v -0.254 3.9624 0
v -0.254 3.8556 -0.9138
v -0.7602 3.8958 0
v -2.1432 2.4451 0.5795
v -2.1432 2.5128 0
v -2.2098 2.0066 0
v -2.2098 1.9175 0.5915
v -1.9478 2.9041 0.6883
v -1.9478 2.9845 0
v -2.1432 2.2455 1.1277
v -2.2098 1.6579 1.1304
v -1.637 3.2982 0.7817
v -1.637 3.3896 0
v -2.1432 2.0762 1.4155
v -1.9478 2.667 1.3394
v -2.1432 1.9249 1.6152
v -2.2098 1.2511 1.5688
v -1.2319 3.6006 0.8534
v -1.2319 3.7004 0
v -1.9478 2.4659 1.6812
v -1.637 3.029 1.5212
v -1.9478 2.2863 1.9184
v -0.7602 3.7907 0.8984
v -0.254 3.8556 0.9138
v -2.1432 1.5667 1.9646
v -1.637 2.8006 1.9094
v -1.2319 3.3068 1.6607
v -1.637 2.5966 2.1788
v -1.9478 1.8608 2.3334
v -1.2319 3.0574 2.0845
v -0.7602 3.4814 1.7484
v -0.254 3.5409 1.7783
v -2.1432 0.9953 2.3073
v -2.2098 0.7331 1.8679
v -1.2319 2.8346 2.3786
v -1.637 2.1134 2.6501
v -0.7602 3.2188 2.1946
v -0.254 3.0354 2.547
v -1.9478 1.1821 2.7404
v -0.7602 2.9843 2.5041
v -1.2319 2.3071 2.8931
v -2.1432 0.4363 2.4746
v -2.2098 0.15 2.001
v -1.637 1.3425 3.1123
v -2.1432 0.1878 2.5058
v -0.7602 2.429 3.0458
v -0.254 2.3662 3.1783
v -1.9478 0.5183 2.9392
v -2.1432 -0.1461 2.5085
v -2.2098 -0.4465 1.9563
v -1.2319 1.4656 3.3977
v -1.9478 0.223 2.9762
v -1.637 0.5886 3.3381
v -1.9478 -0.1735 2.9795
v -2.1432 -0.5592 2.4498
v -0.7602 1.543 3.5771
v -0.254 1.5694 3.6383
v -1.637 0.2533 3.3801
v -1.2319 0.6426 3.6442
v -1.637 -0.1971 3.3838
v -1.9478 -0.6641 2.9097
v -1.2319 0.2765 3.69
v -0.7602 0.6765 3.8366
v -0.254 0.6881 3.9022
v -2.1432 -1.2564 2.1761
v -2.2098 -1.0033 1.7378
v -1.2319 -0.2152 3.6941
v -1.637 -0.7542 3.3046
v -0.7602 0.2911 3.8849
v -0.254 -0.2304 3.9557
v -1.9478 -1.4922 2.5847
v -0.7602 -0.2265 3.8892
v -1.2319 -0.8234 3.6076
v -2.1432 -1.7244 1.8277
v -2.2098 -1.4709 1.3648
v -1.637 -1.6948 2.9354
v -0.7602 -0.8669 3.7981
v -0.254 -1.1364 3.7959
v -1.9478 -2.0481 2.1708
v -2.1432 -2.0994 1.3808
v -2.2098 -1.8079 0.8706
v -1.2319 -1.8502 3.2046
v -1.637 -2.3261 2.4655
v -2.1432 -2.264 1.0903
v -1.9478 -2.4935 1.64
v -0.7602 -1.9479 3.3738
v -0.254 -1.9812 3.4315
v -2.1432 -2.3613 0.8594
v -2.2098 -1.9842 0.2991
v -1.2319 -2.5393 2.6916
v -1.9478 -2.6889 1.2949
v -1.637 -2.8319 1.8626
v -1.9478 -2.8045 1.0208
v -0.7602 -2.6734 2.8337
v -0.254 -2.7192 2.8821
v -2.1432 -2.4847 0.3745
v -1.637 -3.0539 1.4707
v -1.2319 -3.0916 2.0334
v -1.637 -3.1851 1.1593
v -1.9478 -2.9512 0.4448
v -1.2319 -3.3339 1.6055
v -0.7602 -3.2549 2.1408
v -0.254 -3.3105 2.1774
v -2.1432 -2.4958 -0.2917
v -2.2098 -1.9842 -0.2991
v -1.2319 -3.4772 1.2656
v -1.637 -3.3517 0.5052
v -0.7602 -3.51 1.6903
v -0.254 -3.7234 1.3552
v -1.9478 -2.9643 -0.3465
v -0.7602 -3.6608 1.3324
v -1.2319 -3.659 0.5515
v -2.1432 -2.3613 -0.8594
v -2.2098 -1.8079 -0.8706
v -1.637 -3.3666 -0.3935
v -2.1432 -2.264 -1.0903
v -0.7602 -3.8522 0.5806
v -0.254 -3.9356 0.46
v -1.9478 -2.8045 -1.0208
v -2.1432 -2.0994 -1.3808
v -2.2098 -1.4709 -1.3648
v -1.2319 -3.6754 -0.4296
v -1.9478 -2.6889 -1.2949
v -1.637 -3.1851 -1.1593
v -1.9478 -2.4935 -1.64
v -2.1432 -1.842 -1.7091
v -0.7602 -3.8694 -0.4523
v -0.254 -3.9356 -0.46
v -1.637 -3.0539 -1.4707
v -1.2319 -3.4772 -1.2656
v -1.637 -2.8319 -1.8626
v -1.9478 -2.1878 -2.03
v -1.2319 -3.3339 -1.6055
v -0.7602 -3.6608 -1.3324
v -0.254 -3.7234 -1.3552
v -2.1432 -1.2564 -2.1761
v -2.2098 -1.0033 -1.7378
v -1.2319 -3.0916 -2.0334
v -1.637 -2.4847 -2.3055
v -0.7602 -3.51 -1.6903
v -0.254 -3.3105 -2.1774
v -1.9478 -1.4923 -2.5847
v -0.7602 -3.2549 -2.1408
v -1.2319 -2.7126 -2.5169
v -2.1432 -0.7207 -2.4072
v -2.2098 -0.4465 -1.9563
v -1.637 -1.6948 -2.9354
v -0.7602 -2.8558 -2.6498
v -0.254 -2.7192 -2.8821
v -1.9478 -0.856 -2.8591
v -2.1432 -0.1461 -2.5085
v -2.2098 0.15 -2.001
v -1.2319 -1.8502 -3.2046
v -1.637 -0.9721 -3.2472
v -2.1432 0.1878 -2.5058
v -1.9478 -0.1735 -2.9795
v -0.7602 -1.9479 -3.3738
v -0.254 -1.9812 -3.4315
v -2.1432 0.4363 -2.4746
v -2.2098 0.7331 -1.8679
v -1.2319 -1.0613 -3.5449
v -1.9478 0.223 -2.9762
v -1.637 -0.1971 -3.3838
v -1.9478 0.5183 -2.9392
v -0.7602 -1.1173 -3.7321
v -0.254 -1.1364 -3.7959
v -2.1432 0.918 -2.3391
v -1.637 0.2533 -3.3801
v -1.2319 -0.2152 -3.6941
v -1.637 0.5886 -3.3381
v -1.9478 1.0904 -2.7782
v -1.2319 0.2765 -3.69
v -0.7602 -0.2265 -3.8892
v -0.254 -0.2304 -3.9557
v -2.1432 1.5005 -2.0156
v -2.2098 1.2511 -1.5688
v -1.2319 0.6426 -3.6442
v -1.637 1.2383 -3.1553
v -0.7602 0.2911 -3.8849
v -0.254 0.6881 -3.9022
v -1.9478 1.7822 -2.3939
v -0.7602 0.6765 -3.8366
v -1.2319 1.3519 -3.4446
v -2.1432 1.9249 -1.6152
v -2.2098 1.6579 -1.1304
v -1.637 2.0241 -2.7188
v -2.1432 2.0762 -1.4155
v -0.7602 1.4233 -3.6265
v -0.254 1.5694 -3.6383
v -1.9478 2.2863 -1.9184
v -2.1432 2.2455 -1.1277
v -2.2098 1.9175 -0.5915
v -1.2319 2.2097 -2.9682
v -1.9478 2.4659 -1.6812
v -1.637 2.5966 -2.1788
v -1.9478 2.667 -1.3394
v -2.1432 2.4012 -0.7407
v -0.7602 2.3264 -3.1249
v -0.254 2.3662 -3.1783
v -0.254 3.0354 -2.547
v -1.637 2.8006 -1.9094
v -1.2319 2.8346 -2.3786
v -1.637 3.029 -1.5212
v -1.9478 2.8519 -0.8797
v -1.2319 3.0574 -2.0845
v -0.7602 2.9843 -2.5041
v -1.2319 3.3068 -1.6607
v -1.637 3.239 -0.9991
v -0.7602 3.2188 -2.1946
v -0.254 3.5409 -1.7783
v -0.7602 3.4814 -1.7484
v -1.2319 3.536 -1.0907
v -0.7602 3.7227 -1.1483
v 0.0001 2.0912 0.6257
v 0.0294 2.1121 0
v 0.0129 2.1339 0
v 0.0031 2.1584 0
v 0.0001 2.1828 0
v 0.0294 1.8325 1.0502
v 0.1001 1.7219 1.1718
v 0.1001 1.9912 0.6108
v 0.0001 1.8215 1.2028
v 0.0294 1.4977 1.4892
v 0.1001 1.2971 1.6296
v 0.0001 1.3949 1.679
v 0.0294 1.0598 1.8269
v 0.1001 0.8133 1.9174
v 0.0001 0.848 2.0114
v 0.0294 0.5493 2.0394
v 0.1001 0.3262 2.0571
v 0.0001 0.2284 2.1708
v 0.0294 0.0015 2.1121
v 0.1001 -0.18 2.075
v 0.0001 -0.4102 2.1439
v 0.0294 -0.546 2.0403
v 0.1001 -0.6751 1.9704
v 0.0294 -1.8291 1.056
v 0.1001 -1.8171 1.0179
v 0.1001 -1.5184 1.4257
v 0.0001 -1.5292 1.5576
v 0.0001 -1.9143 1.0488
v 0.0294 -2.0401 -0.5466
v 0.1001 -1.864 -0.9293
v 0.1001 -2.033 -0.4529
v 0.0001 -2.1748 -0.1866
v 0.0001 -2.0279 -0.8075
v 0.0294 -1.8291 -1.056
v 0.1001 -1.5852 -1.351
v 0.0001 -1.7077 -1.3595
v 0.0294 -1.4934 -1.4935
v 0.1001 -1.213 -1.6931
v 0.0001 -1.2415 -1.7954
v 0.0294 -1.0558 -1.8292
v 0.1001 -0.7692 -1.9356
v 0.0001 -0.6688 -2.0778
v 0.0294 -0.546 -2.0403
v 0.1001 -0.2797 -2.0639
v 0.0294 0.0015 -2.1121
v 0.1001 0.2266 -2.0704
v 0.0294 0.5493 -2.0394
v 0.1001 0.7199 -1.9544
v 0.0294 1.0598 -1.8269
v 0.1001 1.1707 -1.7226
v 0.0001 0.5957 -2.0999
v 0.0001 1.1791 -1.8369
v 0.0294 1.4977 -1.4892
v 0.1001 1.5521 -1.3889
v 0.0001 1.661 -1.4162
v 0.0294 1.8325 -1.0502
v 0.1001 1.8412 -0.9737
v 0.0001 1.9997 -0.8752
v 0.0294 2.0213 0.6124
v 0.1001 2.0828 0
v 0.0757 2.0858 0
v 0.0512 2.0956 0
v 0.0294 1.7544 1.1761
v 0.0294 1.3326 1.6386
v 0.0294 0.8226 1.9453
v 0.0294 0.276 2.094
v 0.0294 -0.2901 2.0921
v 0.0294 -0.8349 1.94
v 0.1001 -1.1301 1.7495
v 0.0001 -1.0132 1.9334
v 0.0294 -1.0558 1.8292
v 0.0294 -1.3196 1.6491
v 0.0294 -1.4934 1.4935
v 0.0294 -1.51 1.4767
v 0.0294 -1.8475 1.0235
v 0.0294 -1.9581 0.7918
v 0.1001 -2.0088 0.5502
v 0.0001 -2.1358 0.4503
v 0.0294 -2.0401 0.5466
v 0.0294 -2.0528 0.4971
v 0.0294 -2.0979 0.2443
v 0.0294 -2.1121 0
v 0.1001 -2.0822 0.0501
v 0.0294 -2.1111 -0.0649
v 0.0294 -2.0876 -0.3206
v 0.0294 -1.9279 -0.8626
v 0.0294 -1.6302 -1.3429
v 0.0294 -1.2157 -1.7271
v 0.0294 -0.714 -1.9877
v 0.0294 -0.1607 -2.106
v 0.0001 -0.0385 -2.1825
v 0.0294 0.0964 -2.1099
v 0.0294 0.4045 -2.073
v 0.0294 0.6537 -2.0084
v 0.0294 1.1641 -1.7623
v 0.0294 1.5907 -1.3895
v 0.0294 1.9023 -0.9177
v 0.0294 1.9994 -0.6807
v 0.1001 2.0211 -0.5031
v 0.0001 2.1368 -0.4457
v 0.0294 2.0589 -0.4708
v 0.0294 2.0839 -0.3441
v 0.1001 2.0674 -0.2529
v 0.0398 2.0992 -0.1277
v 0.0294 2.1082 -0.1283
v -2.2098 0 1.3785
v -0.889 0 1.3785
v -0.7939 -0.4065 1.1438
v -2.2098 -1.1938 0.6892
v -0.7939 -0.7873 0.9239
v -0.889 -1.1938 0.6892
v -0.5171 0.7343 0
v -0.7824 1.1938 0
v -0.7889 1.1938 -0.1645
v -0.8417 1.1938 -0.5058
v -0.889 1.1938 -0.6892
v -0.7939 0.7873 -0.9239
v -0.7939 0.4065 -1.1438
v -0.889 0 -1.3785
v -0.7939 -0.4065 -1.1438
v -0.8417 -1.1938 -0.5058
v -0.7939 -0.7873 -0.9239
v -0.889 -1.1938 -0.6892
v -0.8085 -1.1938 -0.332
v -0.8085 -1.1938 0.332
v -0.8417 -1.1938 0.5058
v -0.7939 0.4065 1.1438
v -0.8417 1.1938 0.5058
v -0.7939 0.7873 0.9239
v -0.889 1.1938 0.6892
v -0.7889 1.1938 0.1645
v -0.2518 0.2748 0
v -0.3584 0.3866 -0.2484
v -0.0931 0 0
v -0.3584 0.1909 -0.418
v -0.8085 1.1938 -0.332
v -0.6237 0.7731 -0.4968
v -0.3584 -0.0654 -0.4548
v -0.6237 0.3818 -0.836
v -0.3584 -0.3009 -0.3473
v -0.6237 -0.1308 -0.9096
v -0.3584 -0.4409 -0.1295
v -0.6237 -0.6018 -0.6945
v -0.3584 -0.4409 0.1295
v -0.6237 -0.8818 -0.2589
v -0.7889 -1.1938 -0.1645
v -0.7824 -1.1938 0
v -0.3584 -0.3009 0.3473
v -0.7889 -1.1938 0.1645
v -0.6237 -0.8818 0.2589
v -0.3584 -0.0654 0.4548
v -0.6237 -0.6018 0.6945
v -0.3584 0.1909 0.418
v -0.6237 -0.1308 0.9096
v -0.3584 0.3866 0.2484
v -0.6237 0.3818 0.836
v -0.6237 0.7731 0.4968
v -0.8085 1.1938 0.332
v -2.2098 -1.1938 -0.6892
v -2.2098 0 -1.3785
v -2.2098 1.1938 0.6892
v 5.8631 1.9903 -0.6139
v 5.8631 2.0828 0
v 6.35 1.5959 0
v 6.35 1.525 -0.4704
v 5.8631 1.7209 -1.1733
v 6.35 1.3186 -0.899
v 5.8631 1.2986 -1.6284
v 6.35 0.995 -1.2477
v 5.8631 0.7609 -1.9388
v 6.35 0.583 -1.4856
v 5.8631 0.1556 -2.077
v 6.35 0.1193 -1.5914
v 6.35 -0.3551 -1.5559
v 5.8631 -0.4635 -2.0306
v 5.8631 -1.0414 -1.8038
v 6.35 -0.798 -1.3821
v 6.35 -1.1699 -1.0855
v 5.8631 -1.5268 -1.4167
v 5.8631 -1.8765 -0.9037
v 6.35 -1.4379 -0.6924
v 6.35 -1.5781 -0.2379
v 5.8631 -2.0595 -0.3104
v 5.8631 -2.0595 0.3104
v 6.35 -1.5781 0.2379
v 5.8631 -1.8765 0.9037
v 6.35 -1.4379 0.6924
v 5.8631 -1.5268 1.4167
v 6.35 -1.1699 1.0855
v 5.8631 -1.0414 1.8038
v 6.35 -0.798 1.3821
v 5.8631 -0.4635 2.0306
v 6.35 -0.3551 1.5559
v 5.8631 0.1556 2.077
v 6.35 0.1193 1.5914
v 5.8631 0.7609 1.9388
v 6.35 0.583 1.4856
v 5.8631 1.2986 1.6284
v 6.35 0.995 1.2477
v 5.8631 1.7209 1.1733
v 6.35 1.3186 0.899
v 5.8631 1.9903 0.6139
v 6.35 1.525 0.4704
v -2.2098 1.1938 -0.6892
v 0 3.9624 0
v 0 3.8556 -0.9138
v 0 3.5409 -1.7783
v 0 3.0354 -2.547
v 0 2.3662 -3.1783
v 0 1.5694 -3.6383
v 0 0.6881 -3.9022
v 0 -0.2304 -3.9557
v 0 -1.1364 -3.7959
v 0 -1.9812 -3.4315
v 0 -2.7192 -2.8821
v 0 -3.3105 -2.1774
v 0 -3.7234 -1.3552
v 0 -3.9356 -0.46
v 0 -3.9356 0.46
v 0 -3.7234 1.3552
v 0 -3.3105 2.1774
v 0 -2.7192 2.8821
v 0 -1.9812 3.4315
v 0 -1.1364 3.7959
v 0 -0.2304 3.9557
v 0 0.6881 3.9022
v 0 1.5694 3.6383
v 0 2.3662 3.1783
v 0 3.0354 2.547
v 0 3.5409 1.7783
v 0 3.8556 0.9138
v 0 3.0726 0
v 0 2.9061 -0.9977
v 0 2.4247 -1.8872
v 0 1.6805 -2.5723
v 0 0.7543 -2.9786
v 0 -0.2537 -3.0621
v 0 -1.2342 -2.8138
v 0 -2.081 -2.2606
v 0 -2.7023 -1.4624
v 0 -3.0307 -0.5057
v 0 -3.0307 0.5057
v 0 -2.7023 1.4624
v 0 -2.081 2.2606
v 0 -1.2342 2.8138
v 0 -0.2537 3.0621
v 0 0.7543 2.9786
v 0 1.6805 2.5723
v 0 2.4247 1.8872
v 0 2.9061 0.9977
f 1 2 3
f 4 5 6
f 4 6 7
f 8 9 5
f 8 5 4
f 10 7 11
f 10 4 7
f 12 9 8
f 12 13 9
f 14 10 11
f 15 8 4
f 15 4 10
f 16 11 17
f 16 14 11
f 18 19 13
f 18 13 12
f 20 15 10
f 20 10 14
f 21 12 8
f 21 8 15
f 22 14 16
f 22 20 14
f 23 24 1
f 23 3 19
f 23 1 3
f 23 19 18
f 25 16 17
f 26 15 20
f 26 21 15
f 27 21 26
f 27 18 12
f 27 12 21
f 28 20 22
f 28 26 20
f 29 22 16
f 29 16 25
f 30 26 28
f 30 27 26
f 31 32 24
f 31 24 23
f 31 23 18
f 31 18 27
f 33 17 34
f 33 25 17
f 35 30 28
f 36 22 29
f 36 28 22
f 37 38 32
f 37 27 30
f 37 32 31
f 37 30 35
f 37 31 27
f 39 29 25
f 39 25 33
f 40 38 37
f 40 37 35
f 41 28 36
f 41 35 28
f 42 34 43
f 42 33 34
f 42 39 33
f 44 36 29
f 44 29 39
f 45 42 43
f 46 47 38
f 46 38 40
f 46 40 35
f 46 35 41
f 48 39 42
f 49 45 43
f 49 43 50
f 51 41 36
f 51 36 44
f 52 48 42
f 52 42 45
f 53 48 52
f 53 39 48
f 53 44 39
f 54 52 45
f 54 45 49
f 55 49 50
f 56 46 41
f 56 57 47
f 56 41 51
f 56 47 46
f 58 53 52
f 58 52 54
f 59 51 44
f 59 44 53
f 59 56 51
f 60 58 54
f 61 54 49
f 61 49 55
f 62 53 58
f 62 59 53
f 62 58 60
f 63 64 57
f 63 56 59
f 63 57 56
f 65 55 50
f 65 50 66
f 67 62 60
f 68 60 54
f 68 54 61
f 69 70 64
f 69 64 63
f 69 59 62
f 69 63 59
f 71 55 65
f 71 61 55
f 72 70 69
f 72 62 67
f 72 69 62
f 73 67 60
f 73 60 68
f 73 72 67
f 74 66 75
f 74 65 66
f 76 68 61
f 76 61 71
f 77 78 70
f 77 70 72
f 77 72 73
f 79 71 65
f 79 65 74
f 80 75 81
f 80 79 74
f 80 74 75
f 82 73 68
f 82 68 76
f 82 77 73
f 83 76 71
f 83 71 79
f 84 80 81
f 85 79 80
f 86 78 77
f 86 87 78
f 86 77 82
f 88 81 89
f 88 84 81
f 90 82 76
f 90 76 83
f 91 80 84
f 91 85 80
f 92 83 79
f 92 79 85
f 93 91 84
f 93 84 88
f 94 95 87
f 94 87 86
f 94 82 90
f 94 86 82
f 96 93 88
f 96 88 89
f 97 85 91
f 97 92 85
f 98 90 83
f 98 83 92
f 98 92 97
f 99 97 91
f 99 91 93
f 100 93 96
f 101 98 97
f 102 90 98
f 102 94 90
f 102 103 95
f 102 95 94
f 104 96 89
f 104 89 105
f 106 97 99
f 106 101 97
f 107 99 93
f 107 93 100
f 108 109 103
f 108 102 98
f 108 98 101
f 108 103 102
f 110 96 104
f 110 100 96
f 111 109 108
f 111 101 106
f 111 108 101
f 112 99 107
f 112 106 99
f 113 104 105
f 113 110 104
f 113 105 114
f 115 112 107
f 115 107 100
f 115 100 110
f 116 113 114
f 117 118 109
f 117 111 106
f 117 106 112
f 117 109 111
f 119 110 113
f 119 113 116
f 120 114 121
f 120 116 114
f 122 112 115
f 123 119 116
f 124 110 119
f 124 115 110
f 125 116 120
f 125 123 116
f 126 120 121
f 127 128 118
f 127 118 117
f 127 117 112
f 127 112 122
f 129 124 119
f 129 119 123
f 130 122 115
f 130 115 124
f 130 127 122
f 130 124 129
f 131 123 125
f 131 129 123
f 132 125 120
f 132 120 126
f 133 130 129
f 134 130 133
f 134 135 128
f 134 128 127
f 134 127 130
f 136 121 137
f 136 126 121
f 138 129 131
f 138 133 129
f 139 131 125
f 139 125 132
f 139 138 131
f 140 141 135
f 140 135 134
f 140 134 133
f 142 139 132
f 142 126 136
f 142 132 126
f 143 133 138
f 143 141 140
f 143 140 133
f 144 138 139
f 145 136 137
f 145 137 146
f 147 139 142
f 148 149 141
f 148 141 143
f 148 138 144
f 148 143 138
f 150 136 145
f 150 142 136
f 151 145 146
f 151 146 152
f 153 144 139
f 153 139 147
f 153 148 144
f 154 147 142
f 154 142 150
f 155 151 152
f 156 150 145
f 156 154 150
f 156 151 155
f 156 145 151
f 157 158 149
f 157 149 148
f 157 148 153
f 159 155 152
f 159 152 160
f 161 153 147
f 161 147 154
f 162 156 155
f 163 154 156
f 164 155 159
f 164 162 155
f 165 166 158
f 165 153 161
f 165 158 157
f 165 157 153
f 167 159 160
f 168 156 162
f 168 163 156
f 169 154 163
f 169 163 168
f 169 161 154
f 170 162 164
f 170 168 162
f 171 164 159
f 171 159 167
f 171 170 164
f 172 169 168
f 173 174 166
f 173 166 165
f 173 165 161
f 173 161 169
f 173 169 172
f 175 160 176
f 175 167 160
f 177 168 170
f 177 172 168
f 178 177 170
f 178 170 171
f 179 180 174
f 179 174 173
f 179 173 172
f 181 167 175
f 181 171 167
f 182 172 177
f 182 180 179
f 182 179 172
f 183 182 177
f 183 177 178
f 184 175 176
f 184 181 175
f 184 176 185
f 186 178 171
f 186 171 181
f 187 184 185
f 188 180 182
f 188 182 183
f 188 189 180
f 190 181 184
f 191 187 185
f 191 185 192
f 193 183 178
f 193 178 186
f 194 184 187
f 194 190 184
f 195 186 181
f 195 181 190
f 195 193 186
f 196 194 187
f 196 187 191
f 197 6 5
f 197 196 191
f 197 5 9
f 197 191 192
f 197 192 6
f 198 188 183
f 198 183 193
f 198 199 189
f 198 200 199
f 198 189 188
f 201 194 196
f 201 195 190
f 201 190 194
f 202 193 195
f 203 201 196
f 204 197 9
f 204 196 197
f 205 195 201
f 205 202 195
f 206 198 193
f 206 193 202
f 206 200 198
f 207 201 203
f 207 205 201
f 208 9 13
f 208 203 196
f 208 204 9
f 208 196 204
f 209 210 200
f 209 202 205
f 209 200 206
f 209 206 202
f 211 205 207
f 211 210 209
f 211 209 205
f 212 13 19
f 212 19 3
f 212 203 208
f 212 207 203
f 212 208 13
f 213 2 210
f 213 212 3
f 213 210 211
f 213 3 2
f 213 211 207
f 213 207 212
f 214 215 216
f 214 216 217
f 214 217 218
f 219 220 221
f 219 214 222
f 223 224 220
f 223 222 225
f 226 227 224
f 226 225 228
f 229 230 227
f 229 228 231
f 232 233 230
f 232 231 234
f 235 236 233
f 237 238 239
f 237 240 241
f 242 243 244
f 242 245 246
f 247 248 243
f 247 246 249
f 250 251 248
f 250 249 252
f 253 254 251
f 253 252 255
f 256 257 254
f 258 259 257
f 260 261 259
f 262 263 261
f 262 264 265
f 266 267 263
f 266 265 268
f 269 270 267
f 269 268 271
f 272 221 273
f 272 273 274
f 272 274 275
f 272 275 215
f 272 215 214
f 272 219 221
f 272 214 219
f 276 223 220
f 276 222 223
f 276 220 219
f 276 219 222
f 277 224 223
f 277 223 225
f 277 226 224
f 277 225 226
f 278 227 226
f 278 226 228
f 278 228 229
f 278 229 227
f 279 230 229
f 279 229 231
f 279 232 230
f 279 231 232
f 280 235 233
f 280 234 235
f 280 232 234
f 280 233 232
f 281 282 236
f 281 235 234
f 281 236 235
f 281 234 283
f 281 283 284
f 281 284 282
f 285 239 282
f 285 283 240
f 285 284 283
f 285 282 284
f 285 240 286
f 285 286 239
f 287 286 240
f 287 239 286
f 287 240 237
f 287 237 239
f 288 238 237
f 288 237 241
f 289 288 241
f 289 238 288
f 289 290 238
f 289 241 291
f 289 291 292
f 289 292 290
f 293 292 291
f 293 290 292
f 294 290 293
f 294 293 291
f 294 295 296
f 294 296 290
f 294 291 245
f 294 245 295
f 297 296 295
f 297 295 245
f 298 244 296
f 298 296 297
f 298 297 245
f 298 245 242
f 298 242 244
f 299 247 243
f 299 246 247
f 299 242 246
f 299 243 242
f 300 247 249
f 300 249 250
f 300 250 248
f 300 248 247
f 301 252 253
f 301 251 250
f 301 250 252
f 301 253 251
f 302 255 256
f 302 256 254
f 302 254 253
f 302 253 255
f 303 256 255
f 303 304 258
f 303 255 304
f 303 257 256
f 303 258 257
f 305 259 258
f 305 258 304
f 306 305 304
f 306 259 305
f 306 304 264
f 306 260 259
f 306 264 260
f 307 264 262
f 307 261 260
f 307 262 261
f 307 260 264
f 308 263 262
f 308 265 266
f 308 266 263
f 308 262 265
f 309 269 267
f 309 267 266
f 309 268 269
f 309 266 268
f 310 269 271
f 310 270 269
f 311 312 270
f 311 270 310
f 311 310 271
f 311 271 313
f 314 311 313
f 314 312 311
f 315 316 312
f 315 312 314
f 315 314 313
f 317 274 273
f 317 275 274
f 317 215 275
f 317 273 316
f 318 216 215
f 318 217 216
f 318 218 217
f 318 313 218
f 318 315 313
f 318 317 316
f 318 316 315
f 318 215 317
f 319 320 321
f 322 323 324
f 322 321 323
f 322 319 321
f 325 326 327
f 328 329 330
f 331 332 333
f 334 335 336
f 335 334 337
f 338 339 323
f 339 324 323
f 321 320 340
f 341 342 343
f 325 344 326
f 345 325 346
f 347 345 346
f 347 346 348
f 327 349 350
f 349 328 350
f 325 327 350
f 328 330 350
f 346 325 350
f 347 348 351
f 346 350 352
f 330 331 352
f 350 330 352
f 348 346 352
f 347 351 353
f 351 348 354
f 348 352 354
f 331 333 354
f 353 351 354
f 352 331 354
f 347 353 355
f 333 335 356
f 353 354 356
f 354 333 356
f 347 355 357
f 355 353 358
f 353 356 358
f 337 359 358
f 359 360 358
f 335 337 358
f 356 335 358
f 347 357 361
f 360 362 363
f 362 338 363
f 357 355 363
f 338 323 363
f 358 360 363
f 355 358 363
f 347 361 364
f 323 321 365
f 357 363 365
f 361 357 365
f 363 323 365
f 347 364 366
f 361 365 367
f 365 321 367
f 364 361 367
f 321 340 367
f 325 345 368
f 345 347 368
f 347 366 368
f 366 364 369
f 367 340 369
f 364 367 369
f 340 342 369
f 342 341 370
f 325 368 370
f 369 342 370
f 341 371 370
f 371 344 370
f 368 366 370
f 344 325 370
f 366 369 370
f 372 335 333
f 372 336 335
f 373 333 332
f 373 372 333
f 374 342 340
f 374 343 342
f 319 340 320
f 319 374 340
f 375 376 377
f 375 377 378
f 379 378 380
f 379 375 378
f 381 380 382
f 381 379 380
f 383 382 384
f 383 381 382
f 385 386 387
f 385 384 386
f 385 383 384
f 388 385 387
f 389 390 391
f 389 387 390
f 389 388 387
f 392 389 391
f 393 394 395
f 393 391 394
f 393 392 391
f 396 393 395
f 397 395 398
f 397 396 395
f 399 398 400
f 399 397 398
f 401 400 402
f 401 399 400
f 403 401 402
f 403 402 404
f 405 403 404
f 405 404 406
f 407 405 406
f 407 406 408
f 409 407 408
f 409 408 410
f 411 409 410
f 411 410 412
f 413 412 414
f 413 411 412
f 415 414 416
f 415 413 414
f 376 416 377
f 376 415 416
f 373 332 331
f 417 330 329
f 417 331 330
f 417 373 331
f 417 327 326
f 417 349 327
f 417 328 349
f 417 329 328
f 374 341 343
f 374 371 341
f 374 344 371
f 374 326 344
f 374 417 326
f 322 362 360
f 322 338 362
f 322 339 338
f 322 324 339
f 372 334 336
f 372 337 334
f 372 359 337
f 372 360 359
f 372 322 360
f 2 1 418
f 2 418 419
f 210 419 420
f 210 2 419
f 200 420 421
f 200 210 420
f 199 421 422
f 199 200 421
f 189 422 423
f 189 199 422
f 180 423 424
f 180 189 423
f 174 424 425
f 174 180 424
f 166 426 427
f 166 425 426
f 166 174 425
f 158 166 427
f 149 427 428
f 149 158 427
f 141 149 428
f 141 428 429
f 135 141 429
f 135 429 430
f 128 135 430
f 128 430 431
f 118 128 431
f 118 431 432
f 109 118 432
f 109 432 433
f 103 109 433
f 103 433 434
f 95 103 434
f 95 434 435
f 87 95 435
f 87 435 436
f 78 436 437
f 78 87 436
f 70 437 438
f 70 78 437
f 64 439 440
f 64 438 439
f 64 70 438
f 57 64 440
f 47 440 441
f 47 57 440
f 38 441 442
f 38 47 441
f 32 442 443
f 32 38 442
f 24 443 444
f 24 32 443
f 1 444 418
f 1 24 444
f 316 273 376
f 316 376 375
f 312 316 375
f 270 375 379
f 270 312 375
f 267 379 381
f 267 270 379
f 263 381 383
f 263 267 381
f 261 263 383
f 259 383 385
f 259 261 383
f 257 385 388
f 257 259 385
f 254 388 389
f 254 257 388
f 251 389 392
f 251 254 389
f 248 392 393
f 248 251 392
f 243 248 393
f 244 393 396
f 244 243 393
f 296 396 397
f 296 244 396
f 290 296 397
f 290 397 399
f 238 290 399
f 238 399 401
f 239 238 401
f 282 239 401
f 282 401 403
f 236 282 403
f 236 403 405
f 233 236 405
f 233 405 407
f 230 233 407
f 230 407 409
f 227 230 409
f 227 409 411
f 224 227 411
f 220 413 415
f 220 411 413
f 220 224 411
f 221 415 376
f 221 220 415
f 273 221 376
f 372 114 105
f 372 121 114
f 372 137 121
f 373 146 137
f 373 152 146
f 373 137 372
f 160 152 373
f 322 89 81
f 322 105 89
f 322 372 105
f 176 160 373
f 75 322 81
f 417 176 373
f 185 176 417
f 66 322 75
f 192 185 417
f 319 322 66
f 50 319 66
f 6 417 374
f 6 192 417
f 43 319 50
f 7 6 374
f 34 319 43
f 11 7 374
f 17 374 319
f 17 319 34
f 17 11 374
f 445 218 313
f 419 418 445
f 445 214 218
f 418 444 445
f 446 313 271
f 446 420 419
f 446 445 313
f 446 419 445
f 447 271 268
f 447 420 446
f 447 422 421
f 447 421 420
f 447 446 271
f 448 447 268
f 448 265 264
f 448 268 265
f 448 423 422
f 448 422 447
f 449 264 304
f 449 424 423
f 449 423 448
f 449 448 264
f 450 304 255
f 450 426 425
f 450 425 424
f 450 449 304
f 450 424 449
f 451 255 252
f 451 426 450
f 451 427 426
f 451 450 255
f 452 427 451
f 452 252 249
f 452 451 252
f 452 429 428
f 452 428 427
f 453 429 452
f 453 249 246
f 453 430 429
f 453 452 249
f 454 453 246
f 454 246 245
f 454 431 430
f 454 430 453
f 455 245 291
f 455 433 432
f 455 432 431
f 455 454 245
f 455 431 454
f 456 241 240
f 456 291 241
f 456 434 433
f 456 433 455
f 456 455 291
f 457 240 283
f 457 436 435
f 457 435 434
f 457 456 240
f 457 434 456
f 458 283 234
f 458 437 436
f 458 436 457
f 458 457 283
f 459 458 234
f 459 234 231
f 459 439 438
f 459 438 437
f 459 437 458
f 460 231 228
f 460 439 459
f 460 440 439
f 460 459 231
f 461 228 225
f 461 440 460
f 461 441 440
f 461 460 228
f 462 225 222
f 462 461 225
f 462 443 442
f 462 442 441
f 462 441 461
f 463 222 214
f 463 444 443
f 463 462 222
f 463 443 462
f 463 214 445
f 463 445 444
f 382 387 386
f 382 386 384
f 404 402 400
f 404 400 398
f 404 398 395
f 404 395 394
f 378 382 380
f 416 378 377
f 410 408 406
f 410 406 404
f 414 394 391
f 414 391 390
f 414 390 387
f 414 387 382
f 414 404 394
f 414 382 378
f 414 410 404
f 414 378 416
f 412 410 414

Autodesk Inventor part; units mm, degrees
ref_plane "YZ Plane" through (0, 0, 0) normal (1, 0, 0) x (0, 1, 0)
ref_plane "XZ Plane" through (0, 0, 0) normal (0, 1, 0) x (-1, 0, 0)
sketch "Sketch1" plane through (0, 0, 0) normal (0, 0, 1) x (1, 0, 0)
  line L0 (-0.0931, 0) -> (6.35, 0)
  line L1 (6.35, 0) -> (6.35, 2.0828)
  line L2 (6.35, 2.0828) -> (1.5902, 2.0828)
  line L3 (1.5902, 2.0828) -> (0.0001, 2.0828)
  line L4 (0.0001, 2.0828) -> (0, 2.0828)
  line L5 (0, 2.0828) -> (0, 3.9624)
  line L6 (0, 3.9624) -> (-2.2098, 3.9624)
  line L7 (-2.2098, 3.9624) -> (-2.2098, 1.3785)
  line L8 (-2.2098, 1.3785) -> (-0.889, 1.3785)
  line L9 (-0.889, 1.3785) -> (-0.0931, 0)
  line L10 (-3.9218, 0) -> (8.062, 0) projected
  line L11 (0, -0.7925) -> (0, 4.7549) projected
  line L12 (1.5902, 2.0828) -> (0, 2.0828) construction
  dimension "d1" = 4.7598
  dimension "d2" = 1.5901
  dimension "d3" = 2.2098
  dimension "d4" = 1.3208
  dimension "d5" = 60
  dimension "d6" = 4.1656
  dimension "d7" = 4.1656
  dimension "d8" = 2.757
  dimension "d9" = 7.9248
  dimension "d26" = 6.35
revolve "Body" add sketch "Sketch1" angle 360 about axis through (-0.0931, 0, 0) along (1, 0, 0)
sketch "Sketch2" plane through (-2.2098, 0, 0) normal (-1, 0, 0) x (0, 0, 1)
  circle A0 centre (0, 0) radius 1.3785 projected
  line L0 (0, -5.5474) -> (0, 5.5474) projected
  line L1 (-5.5474, 0) -> (5.5474, 0) projected
  line L2 (1.3785, 0) -> (0.6892, -1.1938)
  line L3 (0.6892, -1.1938) -> (-0.6892, -1.1938)
  line L4 (-0.6892, -1.1938) -> (-1.3785, 0)
  line L5 (-1.3785, 0) -> (-0.6892, 1.1938)
  line L6 (-0.6892, 1.1938) -> (0.6892, 1.1938)
  line L7 (0.6892, 1.1938) -> (1.3785, 0)
extrude "Slot" add sketch "Sketch2" against normal up to next contours L7 A0 | A0 L2 | L6 L0 A0 | A0 L0 L3 | L0 L6 A0 | A0 L3 L0 | L4 A0 | A0 L5
fillet "Fillet1" radius 1.9558 1 edges at (-2.2098, -3.9624, 0)
thread "Thread" size "8-32 UNC" class "2A" standard "ANSI Unified Screw Threads" length 4.7598
chamfer "Chamfer1" distance 0.4869 distance2 0.4869 1 edges at (6.35, -2.0828, 0) measured on face at (6.35, -0.5197, -0.4604)
ref_plane "Work Plane1" through (29, 0, 0) normal (0, -1, 0) x (1, 0, 0)
fillet "Fillet2" radius 0.1 1 edges at (0.0001, -2.0828, 0)
equation "\"d1\" = GEL"
equation "\"d3\" = KOH"
equation "\"d4\" = INTI"
equation "\"d6\" = GD"
equation "\"d7\" = BDM"
equation "\"d8\" = 1.1547 * SW"
equation "\"d9\" = KOD"
equation "\"d26\" = NLG"
equation "\"d30\" = R"
equation "\"d17\" = RR"
equation "\"d13\" = GEL"
equation "\"d15\" = -0.5 * SPD + 0.5 * GD"
equation "\"d16\" = GUL"
equation "\"GD\" = NND"
equation "\"NLG\" = 6.35"
equation "\"GEL\" = 4.75976"
equation "\"KOD\" = 7.9248"
equation "\"KOH\" = 2.2098"
equation "\"INTI\" = 1.3208"
equation "\"GAL\" = 1.59004"
equation "\"GUL\" = 0.48692"
equation "\"BDM\" = NND"
equation "\"SW\" = 2.3876"
equation "\"RR\" = 1.9558"
equation "\"SPD\" = 3.19176"
equation "\"R\" = 0.1"
equation "\"TOA\" = 30deg"
equation "\"GD1\" = SPD"
equation "\"THREADDIA\" = 4.1656"
equation "\"KOH1\" = 0.381"
equation "\"NND\" = 4.1656"
equation "\"E0\" = 2.75768"
properties part number "ANSI B18.3 - 8 - 32 x 1/4" material "Steel, Mild"
